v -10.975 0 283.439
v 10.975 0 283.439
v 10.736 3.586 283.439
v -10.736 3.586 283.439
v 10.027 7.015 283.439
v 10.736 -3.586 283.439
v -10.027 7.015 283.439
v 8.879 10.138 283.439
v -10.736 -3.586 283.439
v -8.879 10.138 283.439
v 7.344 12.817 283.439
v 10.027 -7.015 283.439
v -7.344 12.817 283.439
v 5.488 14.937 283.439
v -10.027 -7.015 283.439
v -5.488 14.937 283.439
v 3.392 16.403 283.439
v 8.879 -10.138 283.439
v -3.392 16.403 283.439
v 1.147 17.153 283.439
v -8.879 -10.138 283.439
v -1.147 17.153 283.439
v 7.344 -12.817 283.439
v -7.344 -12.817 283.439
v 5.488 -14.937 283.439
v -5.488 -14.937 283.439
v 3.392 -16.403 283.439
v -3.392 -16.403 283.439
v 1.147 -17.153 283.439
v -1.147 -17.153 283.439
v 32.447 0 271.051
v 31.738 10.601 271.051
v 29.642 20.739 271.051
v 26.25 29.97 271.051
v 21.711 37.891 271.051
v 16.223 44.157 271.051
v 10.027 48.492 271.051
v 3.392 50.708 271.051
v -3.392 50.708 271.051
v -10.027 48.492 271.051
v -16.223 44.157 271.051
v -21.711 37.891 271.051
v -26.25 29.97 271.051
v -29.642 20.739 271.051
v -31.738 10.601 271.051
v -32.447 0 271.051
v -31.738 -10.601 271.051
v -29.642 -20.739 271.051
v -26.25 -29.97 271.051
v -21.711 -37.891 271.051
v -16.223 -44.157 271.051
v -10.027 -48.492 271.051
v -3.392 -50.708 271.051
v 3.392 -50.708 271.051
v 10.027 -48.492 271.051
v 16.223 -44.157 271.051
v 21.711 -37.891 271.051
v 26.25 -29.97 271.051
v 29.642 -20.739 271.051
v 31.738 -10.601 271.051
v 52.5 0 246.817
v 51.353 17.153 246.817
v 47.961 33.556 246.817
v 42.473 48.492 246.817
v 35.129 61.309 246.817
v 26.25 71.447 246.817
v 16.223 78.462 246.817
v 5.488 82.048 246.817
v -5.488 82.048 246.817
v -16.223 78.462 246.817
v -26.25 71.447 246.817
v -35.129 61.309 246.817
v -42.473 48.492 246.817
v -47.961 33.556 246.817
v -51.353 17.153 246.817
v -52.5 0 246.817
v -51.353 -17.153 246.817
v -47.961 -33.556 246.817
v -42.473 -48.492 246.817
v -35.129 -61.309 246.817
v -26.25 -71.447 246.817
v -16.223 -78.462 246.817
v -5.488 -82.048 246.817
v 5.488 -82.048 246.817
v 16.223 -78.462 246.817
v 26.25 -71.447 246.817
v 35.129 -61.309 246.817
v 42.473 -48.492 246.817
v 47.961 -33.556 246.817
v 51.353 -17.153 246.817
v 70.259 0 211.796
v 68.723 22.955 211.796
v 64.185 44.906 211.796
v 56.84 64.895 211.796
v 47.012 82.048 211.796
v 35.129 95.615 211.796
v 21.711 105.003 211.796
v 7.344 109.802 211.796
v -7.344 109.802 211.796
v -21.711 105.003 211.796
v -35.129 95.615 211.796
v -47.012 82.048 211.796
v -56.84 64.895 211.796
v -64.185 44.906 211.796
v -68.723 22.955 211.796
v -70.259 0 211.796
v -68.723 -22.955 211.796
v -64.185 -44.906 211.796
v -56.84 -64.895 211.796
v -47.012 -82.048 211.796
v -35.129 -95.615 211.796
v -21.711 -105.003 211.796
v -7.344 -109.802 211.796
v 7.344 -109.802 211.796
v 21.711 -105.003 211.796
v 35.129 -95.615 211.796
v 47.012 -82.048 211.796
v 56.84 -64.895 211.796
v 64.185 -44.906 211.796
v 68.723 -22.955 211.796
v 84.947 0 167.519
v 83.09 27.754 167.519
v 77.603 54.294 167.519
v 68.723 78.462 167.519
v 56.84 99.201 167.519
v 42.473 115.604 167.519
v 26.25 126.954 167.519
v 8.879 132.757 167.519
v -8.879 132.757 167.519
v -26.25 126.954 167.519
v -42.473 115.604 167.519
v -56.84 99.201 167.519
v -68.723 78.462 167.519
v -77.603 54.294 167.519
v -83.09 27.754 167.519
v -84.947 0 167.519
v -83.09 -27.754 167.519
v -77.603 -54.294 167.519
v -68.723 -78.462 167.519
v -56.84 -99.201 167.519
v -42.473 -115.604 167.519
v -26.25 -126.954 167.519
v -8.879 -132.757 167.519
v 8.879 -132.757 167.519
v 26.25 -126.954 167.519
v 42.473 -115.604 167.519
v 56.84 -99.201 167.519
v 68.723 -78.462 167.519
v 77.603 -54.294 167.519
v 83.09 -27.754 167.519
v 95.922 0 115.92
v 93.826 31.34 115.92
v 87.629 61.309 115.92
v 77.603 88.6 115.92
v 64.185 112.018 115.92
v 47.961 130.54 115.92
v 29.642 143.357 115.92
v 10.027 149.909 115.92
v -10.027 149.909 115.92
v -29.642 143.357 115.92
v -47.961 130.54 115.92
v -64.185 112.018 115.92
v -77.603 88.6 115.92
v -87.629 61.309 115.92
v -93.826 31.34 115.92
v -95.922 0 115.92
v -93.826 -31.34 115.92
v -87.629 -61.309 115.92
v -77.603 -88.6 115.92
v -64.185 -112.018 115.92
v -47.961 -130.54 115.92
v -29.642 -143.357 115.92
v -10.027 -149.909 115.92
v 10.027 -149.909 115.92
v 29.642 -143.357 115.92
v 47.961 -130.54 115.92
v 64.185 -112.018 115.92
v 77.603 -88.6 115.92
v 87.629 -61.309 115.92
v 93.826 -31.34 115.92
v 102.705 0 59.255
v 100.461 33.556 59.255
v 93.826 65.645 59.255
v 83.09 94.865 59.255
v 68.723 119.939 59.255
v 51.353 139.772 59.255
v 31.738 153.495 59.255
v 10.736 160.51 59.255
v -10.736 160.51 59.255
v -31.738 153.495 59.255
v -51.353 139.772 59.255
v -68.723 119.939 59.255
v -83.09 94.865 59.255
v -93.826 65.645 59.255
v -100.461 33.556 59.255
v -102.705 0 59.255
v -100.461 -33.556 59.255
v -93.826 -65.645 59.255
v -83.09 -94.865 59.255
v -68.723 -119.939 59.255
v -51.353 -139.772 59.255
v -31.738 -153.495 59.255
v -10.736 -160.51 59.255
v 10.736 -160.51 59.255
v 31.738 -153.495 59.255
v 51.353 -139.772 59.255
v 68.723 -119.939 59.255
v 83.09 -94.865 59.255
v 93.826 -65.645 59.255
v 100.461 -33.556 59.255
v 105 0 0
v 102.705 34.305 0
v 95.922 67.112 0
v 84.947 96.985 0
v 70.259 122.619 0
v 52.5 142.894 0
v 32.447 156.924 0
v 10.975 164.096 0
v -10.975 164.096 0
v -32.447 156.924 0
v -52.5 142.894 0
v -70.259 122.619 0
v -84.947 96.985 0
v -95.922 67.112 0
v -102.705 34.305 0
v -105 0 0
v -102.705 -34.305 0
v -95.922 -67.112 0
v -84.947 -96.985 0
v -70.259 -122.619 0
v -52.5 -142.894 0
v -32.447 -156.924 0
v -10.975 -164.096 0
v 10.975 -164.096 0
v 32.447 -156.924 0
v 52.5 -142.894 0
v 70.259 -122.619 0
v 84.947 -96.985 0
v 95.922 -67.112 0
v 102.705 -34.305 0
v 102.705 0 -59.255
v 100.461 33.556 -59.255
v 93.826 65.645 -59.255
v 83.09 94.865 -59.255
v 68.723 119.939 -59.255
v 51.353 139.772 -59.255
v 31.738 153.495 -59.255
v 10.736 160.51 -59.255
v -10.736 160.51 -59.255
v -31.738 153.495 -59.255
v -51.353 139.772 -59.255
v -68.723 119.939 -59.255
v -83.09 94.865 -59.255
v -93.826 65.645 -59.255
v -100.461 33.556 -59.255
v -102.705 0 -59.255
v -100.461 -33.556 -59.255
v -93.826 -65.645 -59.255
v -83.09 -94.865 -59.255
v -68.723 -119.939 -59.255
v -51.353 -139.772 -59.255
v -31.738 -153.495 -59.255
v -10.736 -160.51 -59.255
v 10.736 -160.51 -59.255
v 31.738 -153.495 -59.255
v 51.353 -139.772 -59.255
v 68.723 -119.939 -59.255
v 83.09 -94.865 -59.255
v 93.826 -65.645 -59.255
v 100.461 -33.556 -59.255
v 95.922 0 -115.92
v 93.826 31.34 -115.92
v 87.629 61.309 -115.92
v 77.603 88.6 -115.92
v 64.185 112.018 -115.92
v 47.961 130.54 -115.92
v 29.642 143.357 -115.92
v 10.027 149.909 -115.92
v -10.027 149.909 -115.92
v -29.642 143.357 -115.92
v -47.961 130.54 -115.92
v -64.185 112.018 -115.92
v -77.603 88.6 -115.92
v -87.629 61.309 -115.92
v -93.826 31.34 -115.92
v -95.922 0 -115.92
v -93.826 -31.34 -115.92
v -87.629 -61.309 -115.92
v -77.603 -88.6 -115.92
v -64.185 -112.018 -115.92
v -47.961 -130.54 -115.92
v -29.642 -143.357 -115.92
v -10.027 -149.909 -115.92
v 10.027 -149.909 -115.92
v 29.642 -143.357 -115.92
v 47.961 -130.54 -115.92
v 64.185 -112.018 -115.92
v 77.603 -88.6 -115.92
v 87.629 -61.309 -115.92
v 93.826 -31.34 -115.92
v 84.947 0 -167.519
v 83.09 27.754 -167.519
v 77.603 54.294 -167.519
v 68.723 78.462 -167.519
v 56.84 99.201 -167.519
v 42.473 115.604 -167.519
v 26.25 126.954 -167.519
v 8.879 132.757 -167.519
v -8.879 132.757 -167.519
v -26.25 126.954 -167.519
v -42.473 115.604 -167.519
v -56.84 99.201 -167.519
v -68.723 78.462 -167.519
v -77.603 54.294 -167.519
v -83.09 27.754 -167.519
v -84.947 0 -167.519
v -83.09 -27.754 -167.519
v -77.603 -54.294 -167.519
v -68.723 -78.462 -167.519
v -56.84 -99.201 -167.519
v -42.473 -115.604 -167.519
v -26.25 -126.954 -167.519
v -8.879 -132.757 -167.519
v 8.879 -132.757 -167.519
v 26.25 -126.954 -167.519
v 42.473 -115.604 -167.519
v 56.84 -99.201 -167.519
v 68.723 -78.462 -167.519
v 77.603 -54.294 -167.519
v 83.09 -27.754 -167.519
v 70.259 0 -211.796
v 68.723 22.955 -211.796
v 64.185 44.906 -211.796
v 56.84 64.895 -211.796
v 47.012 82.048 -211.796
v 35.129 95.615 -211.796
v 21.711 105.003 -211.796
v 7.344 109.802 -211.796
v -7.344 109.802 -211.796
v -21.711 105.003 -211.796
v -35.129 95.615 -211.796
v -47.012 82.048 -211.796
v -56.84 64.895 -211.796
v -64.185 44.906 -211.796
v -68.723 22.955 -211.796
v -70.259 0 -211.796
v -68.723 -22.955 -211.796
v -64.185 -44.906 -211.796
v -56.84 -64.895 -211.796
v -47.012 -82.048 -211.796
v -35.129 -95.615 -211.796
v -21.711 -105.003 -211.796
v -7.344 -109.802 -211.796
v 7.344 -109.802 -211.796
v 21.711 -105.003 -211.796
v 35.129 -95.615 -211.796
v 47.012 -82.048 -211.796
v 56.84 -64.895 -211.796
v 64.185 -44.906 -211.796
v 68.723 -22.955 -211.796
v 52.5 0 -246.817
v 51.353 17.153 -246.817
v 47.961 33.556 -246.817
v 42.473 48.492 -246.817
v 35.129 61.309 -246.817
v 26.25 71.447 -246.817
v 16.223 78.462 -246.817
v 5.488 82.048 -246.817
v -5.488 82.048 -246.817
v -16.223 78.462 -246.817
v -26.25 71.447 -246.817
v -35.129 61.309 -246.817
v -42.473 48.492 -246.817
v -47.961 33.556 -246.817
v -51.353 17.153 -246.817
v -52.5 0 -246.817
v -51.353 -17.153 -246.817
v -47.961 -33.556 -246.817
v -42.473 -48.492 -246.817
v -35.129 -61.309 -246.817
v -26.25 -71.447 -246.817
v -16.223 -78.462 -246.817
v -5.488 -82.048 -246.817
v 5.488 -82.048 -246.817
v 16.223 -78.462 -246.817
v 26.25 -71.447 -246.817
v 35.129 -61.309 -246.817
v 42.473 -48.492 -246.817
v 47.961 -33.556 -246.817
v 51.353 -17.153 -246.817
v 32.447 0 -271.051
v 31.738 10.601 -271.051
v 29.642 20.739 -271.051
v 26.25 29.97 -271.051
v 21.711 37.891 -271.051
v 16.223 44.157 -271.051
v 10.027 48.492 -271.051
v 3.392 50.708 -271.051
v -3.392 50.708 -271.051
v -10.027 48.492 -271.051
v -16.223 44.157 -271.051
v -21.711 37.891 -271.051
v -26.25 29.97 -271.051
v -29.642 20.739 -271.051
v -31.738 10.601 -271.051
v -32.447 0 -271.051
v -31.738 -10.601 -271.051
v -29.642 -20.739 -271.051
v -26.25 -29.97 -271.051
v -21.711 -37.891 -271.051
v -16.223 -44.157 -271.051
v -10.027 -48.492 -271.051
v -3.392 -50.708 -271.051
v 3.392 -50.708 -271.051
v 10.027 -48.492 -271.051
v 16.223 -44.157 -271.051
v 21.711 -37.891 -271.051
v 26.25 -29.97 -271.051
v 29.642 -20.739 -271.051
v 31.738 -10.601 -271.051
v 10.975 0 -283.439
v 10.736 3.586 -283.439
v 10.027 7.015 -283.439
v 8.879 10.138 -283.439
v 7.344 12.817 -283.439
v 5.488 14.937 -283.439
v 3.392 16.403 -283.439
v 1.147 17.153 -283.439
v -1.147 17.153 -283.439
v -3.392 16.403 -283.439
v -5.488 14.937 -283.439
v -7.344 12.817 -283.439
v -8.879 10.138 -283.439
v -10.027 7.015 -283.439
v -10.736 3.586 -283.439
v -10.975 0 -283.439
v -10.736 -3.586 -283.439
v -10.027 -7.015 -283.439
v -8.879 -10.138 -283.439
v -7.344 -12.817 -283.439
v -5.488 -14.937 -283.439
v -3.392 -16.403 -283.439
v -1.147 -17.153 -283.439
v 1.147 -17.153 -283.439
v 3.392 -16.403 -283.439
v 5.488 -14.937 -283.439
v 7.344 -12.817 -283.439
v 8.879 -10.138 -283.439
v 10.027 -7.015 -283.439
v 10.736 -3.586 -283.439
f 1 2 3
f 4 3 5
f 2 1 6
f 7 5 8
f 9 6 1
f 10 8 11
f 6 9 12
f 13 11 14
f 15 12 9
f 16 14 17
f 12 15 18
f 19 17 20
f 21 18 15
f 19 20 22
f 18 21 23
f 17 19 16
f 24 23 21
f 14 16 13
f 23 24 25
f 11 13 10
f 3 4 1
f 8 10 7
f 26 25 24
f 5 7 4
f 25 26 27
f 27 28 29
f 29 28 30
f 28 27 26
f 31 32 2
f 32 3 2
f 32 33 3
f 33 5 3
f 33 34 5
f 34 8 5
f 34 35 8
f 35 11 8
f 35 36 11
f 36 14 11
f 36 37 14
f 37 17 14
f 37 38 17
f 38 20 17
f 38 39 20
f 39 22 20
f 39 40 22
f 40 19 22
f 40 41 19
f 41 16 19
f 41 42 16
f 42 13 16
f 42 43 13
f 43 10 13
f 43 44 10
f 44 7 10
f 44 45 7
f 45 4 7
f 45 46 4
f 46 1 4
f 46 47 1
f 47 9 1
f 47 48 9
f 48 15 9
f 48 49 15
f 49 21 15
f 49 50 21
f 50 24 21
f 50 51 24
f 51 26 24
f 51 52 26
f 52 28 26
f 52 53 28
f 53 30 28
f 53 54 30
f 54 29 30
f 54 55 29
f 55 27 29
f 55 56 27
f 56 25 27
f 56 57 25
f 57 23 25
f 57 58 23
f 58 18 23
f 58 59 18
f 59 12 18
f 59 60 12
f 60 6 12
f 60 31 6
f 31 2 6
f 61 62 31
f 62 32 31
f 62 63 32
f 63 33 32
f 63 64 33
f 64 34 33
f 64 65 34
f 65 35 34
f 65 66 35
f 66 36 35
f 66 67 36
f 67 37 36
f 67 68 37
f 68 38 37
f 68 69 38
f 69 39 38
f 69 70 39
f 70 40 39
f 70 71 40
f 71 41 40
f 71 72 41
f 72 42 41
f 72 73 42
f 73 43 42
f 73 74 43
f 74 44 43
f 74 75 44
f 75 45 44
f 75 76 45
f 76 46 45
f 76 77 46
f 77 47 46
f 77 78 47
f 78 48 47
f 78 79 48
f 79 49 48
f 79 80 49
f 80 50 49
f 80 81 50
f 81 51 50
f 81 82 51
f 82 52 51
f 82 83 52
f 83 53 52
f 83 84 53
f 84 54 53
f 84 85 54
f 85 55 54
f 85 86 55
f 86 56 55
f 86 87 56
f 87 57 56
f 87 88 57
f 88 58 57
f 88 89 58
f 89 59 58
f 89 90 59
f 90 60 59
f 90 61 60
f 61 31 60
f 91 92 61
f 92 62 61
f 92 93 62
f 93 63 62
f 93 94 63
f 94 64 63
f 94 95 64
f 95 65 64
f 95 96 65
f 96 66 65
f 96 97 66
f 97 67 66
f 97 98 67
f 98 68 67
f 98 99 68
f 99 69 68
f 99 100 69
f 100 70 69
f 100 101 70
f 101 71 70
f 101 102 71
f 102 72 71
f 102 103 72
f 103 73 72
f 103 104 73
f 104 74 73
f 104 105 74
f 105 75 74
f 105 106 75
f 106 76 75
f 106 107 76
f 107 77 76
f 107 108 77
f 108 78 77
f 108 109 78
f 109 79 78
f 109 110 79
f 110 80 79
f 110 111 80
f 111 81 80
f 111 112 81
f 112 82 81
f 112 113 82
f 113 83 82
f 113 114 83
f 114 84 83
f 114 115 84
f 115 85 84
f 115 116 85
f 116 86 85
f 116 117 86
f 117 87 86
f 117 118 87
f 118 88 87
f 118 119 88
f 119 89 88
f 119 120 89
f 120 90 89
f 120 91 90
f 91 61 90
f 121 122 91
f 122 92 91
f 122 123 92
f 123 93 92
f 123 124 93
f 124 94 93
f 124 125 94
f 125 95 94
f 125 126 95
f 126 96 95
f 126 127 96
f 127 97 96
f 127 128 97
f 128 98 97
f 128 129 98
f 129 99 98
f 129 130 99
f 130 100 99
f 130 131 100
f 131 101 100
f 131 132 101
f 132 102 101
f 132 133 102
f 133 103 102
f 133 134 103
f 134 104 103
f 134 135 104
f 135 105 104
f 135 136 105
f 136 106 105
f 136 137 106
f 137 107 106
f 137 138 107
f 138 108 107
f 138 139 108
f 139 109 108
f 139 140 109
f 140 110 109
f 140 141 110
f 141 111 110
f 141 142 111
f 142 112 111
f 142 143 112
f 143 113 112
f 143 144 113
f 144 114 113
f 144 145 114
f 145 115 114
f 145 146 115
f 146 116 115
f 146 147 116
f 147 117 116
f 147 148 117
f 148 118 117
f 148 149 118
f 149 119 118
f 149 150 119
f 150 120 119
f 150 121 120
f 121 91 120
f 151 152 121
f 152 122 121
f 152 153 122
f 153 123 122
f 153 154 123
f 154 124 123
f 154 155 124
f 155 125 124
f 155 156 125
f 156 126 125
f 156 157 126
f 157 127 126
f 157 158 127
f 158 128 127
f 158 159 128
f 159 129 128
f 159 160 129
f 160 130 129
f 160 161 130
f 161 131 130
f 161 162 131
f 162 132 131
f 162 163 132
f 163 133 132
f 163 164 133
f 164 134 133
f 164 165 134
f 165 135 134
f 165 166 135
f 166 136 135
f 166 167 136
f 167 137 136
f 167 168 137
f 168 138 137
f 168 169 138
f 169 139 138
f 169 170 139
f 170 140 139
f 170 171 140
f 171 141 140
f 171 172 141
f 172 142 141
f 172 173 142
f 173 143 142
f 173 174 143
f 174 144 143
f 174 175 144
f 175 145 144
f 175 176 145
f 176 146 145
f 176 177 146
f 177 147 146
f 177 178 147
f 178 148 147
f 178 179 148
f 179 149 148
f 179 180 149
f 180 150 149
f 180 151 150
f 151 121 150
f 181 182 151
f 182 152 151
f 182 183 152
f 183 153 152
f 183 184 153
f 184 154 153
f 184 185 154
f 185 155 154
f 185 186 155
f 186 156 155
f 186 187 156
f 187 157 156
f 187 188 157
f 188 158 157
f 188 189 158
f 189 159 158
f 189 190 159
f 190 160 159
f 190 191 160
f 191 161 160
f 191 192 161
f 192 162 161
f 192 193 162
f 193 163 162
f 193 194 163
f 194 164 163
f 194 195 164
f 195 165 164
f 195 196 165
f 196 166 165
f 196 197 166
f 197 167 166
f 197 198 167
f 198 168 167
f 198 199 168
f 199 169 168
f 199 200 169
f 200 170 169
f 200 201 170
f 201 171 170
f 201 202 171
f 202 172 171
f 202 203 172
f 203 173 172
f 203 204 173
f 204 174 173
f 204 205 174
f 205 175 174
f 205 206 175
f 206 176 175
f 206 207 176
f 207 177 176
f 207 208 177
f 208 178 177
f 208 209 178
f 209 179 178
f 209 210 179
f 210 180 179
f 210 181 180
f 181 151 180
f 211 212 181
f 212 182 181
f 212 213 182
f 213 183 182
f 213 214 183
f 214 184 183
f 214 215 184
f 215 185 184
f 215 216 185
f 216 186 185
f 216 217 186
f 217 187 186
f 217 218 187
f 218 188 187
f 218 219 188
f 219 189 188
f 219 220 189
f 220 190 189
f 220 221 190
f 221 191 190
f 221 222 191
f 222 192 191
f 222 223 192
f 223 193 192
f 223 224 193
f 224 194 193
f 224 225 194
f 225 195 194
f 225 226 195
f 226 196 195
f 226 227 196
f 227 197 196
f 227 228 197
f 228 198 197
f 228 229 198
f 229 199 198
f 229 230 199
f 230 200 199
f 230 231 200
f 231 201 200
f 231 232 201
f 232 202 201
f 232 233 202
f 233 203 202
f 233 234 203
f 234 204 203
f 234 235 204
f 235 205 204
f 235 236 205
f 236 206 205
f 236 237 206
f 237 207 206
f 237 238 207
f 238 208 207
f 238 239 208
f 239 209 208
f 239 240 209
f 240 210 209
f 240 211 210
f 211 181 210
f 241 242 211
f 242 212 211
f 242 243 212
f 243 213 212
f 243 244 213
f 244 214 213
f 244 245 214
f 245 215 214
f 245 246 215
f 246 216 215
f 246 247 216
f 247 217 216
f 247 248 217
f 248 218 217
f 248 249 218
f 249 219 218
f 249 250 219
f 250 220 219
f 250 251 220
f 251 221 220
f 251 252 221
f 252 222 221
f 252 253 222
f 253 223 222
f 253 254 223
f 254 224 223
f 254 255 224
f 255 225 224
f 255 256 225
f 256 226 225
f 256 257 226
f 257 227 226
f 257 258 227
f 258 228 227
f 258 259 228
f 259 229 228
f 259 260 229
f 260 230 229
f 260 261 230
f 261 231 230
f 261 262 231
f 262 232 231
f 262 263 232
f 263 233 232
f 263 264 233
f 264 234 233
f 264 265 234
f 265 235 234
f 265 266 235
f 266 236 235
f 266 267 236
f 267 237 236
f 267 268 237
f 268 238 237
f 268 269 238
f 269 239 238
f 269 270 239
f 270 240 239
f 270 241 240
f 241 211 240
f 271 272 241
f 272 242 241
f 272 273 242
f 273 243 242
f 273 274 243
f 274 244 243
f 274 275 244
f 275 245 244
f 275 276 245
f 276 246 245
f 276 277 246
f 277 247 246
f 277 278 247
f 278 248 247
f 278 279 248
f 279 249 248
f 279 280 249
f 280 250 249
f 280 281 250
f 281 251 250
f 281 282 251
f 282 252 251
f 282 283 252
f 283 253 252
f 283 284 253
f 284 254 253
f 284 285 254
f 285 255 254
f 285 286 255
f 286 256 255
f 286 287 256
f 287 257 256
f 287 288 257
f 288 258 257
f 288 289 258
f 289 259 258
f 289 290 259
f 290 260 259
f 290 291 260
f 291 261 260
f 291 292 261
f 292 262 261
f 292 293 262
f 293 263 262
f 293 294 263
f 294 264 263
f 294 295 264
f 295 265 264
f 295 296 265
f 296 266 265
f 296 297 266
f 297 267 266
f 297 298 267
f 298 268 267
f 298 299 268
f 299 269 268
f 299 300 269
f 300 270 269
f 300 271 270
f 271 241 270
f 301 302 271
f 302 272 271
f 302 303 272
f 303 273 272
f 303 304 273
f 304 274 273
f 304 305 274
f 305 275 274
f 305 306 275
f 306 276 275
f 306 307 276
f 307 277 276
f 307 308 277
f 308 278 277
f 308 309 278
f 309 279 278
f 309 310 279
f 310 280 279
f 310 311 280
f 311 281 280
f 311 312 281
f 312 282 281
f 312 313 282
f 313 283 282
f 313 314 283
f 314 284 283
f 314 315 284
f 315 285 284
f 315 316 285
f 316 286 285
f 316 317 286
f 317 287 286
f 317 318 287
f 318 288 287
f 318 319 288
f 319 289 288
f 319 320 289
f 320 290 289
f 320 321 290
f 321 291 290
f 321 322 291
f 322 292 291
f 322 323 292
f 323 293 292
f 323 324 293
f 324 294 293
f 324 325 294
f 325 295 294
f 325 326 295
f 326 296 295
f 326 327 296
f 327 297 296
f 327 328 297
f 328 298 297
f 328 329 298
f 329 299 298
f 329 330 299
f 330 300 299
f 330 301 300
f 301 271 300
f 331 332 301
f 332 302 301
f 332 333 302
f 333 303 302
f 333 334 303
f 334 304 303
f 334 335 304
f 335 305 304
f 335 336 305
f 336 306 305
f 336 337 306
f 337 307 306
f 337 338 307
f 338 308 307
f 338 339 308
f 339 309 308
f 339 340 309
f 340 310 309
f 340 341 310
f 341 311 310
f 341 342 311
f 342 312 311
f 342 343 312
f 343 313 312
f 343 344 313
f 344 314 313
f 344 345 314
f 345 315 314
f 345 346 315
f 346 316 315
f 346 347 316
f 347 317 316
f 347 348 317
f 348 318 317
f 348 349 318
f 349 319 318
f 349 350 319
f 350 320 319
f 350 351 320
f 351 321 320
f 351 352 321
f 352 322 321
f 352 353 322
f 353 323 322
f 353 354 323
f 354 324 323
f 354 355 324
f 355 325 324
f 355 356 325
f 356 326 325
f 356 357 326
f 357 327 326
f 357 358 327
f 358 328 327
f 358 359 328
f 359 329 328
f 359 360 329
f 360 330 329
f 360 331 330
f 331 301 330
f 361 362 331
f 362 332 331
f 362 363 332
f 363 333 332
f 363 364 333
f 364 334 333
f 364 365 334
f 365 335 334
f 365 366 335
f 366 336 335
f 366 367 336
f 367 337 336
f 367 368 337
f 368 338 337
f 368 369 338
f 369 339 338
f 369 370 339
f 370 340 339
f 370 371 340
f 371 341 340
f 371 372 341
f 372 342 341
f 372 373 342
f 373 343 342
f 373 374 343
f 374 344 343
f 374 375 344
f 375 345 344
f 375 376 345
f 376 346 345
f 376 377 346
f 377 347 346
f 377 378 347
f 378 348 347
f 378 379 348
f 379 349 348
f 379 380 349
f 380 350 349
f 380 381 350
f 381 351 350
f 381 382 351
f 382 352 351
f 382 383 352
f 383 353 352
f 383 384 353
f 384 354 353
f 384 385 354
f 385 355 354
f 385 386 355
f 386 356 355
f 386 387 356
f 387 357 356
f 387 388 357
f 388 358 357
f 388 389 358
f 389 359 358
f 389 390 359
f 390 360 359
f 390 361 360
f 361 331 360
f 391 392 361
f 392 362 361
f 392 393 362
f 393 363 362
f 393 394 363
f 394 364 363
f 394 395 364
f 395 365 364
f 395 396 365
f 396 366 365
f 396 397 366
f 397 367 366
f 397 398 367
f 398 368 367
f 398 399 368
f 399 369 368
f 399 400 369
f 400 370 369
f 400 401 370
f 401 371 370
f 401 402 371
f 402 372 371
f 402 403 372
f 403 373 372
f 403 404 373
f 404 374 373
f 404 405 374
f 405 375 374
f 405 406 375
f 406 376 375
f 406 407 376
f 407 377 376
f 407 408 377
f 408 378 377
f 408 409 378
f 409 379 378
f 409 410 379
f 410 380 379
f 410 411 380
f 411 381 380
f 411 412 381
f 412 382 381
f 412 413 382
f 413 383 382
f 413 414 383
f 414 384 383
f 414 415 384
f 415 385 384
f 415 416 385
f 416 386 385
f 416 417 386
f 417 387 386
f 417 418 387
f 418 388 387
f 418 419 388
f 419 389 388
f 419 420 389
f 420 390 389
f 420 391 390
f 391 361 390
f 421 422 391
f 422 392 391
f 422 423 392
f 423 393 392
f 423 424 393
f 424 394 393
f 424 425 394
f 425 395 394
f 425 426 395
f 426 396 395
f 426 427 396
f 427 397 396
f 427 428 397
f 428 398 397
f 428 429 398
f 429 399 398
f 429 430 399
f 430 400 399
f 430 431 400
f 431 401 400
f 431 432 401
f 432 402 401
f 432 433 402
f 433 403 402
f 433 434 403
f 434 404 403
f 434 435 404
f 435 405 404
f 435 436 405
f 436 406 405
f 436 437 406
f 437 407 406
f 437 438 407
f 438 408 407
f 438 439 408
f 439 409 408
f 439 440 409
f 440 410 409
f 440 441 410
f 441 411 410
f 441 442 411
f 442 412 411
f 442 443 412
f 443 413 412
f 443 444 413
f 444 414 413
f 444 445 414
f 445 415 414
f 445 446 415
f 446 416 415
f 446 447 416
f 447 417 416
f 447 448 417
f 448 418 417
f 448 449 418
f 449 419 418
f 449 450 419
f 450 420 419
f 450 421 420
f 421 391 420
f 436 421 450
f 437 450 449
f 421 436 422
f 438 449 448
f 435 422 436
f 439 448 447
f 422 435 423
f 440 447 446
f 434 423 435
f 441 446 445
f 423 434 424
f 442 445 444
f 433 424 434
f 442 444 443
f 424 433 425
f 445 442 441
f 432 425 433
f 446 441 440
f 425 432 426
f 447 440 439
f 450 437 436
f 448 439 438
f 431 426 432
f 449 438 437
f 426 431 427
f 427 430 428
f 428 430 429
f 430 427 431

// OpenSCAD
// Generated by SolidPython 1.0.1 on 2020-07-29 00:46:47


scale(v = [7, 11, 19]) {
	sphere(r = 15);
}
/***********************************************
*********      SolidPython code:      **********
************************************************
 
# import packages: SolidPython
from solid import *
from solid.utils import *
from itertools import chain, combinations, permutations


class Resize:

    def __init__(self, scad_file):
        self.scad_file = scad_file
        #self.scad_file = import_scad(scad_file)
        # cone/cylinder param:
        self.r1 = 0
        self.r2 = 0
        self.h = 0
        # rectangular prism param:
        self.w = 0
        self.l = 0
        # ellipse param:
        self.r = 0

    # import OpenScad code (file name corresponds to shape)


    # classify shape + parameters
    def assign(self, param1, param2, param3):
        if self.scad_file == 'cone.scad':
            self.r1 = param1
            self.r2 = param2
            self.h = param3
        elif self.scad_file == 'cylinder.scad':
            self.r1 = param1
            self.r2 = param2
            self.h = param3
        elif self.scad_file == 'rectangularPrism.scad':
            self.h = param1
            self.l = param2
            self.w = param3
        else:
            self.r = param1
            self.h = param2

    # resize parameters
    def iterate(self):
        x = range(3, 20, 2)
        i = 1
        if self.scad_file == 'cone.scad':
            tempList = list(permutations(x, 2))
            for temp in tempList:
                param1 = temp[0]
                param2 = temp[1]
                filepath = 'produced_scad_files/' + 'cone' + str(param1) + '_' + str(param2) + '_' + '.scad'
                scad_render_to_file(cylinder(h=param1, r1=param2, r2=0), filepath)

        elif self.scad_file == 'cylinder.scad':
            tempList = list(permutations(x, 3))
            for temp in tempList:
                param1 = temp[0]
                param2 = temp[1]
                filepath = 'produced_scad_files/' + 'cylinder' + str(param1) + '_' + str(param2) + '_' + '.scad'
                scad_render_to_file(cylinder(h=param1, r1=param2, r2=param2), filepath)

        elif self.scad_file == 'rectangularPrism.scad':
            tempList = list(permutations(x, 3))
            for temp in tempList:
                param1 = temp[0]
                param2 = temp[1]
                param3 = temp[2]
                filepath = 'produced_scad_files/' + 'rectangularPrism' + str(param1) + '_' + str(param2) + '_' + str(
                    param3) + '.scad'
                scad_render_to_file(cube(size=(param1, param2, param3)), filepath)

        elif self.scad_file == 'ellipse.scad':
            tempList = list(permutations(x, 4))
            for temp in tempList:
                param1 = temp[0]
                param2 = temp[1]
                param3 = temp[2]
                param4 = temp[3]
                filepath = 'produced_scad_files/' + 'ellipse' + str(param1) + '_' + str(param2) + '_' + str(param3) + '_' + str(param4) + '.scad'
                scad_render_to_file(scale([param1, param2, param3])(sphere(r=param4)), filepath)

    def render_to_scadfile(self):
        scad_render_to_file(scad, 'example.scad') 
 
************************************************/
